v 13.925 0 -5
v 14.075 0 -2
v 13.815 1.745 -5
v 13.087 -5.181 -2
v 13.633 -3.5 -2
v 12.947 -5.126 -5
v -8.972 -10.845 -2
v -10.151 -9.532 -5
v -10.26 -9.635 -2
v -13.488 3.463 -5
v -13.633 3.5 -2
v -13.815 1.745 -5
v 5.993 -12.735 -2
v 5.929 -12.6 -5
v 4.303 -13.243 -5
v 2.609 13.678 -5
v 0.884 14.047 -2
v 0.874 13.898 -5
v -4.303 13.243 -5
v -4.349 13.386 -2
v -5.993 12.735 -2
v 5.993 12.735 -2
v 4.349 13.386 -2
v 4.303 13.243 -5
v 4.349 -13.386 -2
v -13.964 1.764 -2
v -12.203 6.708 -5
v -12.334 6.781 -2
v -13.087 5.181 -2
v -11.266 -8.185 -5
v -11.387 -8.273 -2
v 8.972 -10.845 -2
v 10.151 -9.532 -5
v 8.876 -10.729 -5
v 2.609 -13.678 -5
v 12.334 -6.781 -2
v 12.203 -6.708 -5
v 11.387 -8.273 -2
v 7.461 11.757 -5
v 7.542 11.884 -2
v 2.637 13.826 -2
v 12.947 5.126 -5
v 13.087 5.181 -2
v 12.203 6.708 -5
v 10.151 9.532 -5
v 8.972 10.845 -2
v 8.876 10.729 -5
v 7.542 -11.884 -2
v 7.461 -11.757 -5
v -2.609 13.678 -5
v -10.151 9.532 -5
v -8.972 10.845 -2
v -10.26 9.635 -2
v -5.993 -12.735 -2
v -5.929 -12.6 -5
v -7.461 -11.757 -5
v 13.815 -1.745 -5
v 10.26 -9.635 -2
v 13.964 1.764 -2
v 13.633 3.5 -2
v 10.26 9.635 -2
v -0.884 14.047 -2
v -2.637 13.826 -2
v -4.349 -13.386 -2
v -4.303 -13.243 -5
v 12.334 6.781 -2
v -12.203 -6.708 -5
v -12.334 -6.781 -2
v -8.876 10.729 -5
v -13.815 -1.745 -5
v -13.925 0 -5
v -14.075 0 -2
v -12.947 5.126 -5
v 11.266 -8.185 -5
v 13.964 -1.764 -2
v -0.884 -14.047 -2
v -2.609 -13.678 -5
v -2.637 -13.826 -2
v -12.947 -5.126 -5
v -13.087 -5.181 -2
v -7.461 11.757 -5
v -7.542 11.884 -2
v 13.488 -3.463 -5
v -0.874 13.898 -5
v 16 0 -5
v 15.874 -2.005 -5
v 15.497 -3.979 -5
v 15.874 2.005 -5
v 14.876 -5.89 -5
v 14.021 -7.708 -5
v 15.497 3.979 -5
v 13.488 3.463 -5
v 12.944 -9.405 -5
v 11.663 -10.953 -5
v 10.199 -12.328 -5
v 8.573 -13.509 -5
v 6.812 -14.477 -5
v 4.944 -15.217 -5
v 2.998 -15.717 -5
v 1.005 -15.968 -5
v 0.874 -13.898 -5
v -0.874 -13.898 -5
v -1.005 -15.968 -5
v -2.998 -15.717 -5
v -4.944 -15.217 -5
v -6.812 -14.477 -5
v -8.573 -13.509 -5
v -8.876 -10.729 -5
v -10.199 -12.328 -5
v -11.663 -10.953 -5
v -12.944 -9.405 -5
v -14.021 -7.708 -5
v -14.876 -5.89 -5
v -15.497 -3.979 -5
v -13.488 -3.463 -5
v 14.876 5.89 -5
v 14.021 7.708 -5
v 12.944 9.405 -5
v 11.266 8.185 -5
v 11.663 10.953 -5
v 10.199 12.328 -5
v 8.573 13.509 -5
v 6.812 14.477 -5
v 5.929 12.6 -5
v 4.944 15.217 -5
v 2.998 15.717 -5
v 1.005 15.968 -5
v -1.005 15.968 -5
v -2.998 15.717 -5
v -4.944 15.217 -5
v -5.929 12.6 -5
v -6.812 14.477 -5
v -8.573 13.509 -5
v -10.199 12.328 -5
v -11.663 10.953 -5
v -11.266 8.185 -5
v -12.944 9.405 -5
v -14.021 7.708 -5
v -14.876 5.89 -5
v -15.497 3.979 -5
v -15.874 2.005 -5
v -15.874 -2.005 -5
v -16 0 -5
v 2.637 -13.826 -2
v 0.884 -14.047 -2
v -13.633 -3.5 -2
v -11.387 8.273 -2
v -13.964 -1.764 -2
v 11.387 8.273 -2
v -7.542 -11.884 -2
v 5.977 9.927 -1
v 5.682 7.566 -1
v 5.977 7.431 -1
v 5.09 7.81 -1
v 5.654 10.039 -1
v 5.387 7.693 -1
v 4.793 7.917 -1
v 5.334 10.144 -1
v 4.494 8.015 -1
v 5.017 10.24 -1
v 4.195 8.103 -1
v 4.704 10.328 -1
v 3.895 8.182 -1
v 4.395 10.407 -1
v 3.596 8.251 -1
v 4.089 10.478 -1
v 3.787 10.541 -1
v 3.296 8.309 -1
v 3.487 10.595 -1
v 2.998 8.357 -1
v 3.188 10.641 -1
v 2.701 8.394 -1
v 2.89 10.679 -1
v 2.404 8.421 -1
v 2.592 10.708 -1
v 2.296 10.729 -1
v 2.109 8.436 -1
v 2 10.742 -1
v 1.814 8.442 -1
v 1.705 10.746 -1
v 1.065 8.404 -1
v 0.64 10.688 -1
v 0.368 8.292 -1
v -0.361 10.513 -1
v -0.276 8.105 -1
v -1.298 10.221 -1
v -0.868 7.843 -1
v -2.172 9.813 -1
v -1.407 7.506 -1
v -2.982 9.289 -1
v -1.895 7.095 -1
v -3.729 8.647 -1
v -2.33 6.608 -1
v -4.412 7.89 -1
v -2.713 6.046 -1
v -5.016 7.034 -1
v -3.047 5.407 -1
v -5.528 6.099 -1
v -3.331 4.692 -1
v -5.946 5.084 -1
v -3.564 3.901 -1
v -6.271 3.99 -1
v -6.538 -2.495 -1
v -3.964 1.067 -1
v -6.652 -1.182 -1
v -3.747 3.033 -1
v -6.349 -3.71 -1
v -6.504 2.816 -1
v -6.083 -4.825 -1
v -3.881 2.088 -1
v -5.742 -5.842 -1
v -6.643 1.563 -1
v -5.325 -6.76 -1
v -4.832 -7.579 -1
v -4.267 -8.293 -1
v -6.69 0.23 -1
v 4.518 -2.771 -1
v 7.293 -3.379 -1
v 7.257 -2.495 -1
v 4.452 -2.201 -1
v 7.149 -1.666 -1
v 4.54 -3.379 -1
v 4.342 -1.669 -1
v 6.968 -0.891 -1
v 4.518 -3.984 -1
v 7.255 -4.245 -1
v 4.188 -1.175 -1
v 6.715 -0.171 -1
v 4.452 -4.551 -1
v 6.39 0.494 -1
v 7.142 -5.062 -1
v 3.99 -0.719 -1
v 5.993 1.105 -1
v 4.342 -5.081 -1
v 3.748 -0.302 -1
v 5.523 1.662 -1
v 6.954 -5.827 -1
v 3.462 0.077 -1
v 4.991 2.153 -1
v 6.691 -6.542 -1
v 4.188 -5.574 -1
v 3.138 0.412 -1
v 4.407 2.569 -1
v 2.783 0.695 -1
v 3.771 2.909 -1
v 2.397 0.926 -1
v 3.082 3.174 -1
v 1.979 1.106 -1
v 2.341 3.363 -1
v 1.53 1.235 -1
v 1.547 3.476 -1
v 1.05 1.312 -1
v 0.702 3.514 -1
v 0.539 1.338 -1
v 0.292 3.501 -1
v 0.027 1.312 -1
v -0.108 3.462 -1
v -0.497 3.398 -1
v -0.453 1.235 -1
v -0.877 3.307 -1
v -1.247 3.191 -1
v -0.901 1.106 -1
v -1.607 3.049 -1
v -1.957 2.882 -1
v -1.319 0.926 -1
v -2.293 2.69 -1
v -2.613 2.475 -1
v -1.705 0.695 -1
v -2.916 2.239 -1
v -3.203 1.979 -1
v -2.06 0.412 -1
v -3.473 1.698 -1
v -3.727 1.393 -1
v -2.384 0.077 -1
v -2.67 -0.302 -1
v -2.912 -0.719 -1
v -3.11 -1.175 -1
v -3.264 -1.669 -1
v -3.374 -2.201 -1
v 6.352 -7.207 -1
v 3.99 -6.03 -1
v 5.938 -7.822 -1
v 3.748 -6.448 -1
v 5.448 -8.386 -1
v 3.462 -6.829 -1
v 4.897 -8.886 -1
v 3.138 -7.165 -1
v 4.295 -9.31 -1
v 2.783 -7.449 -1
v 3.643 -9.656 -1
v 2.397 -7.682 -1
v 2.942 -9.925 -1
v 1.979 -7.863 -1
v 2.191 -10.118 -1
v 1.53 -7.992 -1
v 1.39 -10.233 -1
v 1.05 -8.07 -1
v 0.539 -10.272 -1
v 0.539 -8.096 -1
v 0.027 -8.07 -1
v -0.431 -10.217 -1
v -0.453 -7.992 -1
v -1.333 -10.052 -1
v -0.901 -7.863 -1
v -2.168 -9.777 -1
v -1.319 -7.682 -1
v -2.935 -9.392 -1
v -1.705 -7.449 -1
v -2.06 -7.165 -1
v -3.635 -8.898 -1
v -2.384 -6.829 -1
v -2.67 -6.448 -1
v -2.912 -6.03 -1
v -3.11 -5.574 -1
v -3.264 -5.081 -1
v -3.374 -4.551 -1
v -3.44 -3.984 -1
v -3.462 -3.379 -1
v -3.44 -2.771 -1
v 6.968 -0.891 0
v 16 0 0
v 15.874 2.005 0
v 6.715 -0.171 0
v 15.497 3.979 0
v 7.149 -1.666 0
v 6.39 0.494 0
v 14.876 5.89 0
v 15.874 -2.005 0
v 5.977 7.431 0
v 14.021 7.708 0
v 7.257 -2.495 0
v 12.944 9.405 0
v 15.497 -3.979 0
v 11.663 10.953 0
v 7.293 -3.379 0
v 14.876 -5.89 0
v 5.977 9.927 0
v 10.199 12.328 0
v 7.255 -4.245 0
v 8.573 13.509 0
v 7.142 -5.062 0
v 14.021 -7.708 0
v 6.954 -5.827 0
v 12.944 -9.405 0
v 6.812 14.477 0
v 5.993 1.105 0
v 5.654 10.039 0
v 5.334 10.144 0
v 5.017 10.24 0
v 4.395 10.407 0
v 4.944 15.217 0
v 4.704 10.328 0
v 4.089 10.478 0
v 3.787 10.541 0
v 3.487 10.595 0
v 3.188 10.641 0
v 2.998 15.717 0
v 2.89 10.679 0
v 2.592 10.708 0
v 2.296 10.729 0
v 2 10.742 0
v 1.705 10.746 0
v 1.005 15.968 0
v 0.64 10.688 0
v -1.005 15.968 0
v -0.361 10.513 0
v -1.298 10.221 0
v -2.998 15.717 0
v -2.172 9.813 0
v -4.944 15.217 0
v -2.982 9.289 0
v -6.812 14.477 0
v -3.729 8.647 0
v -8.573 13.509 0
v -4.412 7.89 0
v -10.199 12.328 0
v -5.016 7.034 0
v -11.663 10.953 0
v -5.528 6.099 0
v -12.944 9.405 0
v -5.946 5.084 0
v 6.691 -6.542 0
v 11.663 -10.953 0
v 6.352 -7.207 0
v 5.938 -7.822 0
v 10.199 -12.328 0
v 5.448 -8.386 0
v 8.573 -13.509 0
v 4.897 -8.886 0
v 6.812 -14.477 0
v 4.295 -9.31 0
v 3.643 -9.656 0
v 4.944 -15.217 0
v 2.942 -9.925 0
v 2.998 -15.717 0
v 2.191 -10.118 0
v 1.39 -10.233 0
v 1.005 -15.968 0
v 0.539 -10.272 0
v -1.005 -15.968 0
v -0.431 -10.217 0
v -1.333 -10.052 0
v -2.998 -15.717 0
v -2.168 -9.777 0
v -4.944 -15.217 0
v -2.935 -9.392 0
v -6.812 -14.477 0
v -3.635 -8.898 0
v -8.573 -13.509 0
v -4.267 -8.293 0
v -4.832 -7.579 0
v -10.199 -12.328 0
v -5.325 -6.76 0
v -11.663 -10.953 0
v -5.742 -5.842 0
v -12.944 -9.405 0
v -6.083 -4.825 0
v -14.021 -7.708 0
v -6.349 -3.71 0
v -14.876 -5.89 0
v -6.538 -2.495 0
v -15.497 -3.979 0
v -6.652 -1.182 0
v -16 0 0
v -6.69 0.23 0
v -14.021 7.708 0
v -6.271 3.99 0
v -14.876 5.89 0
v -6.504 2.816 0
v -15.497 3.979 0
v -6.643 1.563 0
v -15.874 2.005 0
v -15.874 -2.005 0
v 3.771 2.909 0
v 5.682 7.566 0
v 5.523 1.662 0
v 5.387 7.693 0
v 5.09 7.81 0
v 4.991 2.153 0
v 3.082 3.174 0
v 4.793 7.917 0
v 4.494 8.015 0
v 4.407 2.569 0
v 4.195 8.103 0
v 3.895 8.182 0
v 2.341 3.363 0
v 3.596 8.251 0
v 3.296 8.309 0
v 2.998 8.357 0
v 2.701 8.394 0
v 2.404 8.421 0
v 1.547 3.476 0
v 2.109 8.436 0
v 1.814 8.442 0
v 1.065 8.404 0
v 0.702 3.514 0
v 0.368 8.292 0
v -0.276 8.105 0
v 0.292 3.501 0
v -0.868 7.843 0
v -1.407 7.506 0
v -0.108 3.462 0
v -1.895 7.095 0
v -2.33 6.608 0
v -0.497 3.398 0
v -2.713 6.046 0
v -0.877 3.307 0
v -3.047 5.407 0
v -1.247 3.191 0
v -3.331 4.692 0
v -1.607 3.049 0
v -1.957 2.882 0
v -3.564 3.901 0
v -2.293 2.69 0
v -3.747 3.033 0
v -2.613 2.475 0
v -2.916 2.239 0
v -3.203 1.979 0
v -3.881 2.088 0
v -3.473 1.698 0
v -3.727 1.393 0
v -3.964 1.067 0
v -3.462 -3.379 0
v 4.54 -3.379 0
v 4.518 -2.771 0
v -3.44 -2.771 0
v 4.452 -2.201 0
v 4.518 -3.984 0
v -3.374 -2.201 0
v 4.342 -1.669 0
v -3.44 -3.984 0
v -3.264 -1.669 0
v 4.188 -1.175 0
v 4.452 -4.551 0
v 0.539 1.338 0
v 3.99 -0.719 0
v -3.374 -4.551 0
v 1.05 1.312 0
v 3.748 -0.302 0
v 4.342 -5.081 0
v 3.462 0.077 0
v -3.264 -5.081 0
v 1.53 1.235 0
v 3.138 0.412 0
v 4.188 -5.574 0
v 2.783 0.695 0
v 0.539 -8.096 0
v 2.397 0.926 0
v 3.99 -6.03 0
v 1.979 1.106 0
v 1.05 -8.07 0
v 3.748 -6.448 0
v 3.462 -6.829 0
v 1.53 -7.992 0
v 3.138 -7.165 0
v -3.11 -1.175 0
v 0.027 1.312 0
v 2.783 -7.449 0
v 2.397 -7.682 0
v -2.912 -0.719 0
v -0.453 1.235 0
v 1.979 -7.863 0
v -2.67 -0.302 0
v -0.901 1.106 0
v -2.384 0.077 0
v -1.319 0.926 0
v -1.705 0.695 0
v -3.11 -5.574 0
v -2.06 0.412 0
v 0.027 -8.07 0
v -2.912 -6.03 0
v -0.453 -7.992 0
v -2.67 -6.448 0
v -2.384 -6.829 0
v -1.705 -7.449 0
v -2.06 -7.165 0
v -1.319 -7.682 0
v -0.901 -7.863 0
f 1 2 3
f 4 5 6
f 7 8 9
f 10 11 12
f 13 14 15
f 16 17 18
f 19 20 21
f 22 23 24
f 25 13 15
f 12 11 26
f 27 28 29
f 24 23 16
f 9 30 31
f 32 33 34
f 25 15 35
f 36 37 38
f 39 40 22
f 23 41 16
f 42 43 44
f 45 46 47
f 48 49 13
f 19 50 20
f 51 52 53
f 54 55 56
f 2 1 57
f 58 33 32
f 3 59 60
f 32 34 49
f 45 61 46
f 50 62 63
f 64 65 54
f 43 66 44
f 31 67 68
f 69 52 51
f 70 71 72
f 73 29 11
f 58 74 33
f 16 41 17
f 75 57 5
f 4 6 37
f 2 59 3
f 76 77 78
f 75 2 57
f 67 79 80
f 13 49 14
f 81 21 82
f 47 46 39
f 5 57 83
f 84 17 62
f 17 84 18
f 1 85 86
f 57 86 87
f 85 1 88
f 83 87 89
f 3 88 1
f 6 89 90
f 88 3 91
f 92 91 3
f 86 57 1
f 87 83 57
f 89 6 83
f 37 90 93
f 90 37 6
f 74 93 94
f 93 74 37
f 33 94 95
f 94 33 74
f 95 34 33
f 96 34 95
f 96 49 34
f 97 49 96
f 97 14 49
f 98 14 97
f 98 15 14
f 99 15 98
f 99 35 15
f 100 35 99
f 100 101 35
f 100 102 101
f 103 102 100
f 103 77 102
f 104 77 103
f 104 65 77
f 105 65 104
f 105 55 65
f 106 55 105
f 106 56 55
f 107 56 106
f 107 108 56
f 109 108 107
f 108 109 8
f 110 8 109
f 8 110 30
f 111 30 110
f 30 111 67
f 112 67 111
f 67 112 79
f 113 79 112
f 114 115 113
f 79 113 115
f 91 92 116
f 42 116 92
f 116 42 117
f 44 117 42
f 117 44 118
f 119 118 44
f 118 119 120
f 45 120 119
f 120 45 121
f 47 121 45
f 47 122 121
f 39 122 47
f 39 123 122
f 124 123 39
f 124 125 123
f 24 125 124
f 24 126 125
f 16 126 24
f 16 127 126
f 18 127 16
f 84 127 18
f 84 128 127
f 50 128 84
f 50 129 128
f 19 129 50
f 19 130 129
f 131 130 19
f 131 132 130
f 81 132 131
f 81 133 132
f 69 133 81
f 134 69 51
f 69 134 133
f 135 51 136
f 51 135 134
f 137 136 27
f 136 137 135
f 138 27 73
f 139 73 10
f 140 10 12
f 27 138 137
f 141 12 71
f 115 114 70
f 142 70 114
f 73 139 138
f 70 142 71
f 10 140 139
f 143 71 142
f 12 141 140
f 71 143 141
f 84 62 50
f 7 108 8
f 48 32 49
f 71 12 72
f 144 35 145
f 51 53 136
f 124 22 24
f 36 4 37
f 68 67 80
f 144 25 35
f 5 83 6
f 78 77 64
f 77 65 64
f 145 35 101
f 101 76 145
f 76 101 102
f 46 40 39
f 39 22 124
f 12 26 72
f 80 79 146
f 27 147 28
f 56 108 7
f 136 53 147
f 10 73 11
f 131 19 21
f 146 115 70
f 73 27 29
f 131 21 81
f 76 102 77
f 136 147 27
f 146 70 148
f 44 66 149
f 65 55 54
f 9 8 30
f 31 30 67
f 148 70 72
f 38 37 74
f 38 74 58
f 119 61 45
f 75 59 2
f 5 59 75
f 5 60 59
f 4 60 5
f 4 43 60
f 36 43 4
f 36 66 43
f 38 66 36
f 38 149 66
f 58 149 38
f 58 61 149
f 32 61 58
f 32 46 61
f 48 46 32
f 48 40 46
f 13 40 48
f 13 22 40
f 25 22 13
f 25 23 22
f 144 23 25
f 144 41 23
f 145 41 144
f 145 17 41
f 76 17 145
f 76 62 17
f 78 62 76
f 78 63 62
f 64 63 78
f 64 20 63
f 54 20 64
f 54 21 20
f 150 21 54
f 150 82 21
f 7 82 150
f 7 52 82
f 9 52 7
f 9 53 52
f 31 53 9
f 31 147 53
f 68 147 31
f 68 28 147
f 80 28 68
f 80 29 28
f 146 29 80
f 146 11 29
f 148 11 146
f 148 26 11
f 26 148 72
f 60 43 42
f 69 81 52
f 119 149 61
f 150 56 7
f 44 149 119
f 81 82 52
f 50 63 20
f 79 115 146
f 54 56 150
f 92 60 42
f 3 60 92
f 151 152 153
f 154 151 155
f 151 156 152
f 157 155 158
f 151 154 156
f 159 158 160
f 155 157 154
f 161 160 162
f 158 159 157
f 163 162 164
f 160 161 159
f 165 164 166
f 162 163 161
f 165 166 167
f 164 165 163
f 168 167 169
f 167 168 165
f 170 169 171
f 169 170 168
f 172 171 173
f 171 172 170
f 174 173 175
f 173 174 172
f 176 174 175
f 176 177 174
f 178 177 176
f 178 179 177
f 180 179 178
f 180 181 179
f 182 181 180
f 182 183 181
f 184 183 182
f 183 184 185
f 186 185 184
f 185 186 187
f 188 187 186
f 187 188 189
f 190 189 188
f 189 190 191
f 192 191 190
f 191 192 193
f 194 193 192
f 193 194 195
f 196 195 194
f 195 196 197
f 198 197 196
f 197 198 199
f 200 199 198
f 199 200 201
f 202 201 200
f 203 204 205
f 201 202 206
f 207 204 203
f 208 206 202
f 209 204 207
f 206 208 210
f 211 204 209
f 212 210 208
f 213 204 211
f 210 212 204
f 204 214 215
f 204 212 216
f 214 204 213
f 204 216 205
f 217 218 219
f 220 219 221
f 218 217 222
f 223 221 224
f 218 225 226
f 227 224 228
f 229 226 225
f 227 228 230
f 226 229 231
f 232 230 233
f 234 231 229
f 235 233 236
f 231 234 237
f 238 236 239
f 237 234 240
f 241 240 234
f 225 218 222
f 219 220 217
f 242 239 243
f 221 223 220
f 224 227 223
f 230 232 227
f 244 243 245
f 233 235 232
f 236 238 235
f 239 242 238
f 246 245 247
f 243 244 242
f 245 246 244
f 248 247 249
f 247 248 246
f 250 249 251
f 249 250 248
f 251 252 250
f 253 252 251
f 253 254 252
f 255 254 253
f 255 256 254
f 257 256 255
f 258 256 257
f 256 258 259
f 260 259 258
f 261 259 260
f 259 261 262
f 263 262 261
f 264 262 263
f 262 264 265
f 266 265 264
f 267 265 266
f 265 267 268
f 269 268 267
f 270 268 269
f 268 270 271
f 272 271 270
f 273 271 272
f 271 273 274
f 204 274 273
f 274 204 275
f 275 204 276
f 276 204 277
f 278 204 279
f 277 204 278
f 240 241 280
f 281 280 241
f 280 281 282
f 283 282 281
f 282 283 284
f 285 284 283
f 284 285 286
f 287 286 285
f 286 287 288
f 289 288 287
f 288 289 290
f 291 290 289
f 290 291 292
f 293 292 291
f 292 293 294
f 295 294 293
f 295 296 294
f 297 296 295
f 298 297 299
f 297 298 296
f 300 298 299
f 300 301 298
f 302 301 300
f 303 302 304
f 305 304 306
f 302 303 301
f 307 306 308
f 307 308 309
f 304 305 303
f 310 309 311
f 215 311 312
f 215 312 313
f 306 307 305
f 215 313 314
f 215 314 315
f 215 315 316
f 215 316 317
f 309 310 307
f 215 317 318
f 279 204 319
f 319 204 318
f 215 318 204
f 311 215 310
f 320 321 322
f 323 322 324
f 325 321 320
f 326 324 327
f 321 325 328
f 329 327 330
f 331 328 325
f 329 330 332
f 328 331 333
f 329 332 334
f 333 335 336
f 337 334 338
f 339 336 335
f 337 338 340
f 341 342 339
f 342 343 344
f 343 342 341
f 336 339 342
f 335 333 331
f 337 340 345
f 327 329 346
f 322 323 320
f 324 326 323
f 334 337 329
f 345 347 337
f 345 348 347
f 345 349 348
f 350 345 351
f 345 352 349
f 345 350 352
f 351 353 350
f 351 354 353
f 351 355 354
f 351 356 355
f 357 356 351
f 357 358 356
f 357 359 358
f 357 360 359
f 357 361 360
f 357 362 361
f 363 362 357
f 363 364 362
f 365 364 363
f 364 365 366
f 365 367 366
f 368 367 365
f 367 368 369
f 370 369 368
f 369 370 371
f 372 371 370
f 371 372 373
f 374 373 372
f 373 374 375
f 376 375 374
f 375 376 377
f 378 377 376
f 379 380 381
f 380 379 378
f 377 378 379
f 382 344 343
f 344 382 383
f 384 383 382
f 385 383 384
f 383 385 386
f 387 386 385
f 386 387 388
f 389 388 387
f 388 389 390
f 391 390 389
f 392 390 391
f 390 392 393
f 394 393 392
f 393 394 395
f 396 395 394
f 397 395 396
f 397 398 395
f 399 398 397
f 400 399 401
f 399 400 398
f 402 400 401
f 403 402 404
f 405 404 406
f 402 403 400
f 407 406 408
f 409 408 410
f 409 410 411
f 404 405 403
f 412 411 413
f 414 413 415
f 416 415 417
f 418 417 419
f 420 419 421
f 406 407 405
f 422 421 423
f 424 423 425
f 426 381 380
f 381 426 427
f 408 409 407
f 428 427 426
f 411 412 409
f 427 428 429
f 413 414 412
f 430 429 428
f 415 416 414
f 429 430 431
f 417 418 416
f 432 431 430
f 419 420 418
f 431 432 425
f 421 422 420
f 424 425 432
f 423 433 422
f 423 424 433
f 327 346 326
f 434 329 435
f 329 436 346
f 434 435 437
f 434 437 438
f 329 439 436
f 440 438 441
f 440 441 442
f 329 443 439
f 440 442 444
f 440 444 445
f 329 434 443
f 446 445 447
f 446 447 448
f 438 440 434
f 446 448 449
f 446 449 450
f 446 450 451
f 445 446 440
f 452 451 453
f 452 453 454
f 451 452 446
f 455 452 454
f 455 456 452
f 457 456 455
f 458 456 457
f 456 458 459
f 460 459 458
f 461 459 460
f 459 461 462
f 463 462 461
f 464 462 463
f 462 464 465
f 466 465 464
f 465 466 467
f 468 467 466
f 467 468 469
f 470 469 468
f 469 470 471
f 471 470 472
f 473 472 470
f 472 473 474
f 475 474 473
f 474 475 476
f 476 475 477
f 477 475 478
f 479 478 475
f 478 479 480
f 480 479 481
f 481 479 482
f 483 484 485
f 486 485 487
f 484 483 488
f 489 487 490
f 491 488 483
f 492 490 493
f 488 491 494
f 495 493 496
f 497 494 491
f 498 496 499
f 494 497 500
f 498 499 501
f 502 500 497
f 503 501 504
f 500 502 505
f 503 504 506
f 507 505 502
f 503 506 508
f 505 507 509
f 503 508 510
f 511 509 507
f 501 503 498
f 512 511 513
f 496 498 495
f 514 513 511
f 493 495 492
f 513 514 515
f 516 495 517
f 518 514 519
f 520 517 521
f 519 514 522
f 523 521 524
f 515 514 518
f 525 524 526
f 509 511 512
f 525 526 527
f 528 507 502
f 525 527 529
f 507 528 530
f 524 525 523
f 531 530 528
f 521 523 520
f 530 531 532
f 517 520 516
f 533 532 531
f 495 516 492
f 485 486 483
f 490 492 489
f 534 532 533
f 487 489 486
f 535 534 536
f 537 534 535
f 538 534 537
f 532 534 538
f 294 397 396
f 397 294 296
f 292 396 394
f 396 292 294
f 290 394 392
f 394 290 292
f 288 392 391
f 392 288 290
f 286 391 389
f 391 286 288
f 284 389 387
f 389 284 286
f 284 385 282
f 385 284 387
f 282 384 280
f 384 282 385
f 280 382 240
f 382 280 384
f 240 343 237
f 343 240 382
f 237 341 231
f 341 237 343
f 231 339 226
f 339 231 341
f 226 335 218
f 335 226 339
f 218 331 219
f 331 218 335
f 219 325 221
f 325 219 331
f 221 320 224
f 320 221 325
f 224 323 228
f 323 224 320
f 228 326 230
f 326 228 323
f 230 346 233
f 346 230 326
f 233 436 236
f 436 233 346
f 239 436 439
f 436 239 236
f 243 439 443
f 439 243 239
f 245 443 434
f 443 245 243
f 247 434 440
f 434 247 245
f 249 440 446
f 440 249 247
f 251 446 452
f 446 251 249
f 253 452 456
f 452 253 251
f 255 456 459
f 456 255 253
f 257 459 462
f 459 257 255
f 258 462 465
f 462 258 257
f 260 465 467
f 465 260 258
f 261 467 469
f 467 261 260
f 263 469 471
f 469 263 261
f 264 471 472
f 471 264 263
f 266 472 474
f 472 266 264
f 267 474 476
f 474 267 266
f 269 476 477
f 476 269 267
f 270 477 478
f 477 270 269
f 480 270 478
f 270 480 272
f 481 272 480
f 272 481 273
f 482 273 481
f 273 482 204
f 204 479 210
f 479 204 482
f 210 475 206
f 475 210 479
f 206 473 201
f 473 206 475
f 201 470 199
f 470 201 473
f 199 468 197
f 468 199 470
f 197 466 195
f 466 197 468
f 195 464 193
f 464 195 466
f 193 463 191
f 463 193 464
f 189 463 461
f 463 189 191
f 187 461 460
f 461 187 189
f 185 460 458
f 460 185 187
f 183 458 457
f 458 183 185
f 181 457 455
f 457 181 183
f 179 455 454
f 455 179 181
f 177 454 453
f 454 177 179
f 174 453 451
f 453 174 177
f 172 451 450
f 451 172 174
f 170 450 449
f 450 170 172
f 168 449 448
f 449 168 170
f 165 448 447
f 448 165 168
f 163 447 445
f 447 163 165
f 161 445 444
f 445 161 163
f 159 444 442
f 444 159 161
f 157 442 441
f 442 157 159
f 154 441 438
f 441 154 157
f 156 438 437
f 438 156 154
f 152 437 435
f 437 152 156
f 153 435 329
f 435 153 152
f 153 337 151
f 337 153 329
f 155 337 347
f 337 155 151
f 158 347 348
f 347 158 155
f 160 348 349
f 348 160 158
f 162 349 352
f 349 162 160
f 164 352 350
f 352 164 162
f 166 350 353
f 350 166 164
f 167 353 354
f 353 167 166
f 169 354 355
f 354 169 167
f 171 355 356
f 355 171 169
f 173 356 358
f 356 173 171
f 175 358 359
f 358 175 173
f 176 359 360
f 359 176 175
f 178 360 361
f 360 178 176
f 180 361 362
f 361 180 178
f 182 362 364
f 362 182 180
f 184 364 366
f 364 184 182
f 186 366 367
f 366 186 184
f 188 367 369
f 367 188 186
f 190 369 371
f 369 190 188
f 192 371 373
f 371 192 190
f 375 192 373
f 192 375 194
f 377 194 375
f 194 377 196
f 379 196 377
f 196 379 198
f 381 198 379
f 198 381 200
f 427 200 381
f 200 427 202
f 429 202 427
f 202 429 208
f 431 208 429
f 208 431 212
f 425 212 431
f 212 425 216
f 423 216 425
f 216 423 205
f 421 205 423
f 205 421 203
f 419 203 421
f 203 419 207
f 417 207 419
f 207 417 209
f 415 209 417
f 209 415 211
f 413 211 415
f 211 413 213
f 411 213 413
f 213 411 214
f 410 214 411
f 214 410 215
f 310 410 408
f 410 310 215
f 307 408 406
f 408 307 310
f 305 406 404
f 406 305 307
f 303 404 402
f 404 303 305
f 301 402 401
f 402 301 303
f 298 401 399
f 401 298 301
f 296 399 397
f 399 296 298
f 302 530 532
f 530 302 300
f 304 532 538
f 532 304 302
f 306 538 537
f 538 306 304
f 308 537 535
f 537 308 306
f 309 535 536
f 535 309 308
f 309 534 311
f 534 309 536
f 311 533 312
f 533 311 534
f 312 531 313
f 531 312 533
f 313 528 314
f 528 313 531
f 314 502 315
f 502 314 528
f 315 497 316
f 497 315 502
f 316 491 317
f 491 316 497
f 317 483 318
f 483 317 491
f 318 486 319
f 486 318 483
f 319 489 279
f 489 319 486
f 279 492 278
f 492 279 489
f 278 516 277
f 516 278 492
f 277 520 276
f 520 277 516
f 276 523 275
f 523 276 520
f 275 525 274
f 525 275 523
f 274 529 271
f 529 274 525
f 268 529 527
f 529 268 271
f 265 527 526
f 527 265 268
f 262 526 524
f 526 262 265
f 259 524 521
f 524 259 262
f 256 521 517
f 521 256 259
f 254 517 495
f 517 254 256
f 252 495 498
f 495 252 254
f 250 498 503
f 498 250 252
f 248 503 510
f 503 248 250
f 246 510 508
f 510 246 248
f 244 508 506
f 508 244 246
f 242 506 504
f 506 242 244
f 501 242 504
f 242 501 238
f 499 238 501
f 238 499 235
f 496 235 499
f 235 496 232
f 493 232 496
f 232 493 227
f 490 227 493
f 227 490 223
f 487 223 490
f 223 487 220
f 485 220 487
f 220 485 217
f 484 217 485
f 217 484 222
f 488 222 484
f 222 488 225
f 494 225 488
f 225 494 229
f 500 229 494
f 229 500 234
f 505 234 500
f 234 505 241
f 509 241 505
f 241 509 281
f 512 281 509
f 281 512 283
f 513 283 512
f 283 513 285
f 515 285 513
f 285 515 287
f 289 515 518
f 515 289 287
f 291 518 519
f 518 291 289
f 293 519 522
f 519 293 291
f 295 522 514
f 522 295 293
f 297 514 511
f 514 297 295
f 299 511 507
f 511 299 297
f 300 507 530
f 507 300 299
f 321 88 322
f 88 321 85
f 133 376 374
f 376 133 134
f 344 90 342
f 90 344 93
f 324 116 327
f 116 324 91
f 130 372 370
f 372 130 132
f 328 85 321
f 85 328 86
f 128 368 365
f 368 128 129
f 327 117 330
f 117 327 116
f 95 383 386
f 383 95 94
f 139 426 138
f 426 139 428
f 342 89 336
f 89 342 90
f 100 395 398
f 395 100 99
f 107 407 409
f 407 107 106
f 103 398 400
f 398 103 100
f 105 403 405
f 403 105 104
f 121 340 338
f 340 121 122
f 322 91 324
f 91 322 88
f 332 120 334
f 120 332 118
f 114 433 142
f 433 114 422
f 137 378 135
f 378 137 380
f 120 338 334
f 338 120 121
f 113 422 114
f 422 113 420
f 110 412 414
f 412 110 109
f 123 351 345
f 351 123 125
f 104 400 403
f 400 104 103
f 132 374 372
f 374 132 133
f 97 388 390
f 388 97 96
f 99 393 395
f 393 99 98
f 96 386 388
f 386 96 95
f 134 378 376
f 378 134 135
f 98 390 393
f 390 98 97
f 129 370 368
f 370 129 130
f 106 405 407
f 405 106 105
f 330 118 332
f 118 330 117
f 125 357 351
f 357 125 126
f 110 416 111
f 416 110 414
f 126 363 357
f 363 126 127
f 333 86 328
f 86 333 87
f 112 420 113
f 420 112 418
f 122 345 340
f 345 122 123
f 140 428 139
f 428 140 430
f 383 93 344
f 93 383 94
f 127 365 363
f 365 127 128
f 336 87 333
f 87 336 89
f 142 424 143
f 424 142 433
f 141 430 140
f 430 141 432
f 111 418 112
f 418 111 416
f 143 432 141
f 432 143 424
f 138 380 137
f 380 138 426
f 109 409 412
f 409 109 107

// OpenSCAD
$fn = 50;


difference() {
	union() {
		translate(v = [0, 0, -5.0000000000]) {
			cylinder(h = 5, r = 16.0000000000);
		}
	}
	union() {
		#translate(v = [0, 0, -5.0000000000]) {
			cylinder(h = 3, r1 = 13.9250000000, r2 = 14.0750000000);
		}
		translate(v = [0, 0, -1]) {
			linear_extrude(height = 1) {
				text(font = "Impact", halign = "center", size = 20, text = "6", valign = "center");
			}
		}
	}
}
